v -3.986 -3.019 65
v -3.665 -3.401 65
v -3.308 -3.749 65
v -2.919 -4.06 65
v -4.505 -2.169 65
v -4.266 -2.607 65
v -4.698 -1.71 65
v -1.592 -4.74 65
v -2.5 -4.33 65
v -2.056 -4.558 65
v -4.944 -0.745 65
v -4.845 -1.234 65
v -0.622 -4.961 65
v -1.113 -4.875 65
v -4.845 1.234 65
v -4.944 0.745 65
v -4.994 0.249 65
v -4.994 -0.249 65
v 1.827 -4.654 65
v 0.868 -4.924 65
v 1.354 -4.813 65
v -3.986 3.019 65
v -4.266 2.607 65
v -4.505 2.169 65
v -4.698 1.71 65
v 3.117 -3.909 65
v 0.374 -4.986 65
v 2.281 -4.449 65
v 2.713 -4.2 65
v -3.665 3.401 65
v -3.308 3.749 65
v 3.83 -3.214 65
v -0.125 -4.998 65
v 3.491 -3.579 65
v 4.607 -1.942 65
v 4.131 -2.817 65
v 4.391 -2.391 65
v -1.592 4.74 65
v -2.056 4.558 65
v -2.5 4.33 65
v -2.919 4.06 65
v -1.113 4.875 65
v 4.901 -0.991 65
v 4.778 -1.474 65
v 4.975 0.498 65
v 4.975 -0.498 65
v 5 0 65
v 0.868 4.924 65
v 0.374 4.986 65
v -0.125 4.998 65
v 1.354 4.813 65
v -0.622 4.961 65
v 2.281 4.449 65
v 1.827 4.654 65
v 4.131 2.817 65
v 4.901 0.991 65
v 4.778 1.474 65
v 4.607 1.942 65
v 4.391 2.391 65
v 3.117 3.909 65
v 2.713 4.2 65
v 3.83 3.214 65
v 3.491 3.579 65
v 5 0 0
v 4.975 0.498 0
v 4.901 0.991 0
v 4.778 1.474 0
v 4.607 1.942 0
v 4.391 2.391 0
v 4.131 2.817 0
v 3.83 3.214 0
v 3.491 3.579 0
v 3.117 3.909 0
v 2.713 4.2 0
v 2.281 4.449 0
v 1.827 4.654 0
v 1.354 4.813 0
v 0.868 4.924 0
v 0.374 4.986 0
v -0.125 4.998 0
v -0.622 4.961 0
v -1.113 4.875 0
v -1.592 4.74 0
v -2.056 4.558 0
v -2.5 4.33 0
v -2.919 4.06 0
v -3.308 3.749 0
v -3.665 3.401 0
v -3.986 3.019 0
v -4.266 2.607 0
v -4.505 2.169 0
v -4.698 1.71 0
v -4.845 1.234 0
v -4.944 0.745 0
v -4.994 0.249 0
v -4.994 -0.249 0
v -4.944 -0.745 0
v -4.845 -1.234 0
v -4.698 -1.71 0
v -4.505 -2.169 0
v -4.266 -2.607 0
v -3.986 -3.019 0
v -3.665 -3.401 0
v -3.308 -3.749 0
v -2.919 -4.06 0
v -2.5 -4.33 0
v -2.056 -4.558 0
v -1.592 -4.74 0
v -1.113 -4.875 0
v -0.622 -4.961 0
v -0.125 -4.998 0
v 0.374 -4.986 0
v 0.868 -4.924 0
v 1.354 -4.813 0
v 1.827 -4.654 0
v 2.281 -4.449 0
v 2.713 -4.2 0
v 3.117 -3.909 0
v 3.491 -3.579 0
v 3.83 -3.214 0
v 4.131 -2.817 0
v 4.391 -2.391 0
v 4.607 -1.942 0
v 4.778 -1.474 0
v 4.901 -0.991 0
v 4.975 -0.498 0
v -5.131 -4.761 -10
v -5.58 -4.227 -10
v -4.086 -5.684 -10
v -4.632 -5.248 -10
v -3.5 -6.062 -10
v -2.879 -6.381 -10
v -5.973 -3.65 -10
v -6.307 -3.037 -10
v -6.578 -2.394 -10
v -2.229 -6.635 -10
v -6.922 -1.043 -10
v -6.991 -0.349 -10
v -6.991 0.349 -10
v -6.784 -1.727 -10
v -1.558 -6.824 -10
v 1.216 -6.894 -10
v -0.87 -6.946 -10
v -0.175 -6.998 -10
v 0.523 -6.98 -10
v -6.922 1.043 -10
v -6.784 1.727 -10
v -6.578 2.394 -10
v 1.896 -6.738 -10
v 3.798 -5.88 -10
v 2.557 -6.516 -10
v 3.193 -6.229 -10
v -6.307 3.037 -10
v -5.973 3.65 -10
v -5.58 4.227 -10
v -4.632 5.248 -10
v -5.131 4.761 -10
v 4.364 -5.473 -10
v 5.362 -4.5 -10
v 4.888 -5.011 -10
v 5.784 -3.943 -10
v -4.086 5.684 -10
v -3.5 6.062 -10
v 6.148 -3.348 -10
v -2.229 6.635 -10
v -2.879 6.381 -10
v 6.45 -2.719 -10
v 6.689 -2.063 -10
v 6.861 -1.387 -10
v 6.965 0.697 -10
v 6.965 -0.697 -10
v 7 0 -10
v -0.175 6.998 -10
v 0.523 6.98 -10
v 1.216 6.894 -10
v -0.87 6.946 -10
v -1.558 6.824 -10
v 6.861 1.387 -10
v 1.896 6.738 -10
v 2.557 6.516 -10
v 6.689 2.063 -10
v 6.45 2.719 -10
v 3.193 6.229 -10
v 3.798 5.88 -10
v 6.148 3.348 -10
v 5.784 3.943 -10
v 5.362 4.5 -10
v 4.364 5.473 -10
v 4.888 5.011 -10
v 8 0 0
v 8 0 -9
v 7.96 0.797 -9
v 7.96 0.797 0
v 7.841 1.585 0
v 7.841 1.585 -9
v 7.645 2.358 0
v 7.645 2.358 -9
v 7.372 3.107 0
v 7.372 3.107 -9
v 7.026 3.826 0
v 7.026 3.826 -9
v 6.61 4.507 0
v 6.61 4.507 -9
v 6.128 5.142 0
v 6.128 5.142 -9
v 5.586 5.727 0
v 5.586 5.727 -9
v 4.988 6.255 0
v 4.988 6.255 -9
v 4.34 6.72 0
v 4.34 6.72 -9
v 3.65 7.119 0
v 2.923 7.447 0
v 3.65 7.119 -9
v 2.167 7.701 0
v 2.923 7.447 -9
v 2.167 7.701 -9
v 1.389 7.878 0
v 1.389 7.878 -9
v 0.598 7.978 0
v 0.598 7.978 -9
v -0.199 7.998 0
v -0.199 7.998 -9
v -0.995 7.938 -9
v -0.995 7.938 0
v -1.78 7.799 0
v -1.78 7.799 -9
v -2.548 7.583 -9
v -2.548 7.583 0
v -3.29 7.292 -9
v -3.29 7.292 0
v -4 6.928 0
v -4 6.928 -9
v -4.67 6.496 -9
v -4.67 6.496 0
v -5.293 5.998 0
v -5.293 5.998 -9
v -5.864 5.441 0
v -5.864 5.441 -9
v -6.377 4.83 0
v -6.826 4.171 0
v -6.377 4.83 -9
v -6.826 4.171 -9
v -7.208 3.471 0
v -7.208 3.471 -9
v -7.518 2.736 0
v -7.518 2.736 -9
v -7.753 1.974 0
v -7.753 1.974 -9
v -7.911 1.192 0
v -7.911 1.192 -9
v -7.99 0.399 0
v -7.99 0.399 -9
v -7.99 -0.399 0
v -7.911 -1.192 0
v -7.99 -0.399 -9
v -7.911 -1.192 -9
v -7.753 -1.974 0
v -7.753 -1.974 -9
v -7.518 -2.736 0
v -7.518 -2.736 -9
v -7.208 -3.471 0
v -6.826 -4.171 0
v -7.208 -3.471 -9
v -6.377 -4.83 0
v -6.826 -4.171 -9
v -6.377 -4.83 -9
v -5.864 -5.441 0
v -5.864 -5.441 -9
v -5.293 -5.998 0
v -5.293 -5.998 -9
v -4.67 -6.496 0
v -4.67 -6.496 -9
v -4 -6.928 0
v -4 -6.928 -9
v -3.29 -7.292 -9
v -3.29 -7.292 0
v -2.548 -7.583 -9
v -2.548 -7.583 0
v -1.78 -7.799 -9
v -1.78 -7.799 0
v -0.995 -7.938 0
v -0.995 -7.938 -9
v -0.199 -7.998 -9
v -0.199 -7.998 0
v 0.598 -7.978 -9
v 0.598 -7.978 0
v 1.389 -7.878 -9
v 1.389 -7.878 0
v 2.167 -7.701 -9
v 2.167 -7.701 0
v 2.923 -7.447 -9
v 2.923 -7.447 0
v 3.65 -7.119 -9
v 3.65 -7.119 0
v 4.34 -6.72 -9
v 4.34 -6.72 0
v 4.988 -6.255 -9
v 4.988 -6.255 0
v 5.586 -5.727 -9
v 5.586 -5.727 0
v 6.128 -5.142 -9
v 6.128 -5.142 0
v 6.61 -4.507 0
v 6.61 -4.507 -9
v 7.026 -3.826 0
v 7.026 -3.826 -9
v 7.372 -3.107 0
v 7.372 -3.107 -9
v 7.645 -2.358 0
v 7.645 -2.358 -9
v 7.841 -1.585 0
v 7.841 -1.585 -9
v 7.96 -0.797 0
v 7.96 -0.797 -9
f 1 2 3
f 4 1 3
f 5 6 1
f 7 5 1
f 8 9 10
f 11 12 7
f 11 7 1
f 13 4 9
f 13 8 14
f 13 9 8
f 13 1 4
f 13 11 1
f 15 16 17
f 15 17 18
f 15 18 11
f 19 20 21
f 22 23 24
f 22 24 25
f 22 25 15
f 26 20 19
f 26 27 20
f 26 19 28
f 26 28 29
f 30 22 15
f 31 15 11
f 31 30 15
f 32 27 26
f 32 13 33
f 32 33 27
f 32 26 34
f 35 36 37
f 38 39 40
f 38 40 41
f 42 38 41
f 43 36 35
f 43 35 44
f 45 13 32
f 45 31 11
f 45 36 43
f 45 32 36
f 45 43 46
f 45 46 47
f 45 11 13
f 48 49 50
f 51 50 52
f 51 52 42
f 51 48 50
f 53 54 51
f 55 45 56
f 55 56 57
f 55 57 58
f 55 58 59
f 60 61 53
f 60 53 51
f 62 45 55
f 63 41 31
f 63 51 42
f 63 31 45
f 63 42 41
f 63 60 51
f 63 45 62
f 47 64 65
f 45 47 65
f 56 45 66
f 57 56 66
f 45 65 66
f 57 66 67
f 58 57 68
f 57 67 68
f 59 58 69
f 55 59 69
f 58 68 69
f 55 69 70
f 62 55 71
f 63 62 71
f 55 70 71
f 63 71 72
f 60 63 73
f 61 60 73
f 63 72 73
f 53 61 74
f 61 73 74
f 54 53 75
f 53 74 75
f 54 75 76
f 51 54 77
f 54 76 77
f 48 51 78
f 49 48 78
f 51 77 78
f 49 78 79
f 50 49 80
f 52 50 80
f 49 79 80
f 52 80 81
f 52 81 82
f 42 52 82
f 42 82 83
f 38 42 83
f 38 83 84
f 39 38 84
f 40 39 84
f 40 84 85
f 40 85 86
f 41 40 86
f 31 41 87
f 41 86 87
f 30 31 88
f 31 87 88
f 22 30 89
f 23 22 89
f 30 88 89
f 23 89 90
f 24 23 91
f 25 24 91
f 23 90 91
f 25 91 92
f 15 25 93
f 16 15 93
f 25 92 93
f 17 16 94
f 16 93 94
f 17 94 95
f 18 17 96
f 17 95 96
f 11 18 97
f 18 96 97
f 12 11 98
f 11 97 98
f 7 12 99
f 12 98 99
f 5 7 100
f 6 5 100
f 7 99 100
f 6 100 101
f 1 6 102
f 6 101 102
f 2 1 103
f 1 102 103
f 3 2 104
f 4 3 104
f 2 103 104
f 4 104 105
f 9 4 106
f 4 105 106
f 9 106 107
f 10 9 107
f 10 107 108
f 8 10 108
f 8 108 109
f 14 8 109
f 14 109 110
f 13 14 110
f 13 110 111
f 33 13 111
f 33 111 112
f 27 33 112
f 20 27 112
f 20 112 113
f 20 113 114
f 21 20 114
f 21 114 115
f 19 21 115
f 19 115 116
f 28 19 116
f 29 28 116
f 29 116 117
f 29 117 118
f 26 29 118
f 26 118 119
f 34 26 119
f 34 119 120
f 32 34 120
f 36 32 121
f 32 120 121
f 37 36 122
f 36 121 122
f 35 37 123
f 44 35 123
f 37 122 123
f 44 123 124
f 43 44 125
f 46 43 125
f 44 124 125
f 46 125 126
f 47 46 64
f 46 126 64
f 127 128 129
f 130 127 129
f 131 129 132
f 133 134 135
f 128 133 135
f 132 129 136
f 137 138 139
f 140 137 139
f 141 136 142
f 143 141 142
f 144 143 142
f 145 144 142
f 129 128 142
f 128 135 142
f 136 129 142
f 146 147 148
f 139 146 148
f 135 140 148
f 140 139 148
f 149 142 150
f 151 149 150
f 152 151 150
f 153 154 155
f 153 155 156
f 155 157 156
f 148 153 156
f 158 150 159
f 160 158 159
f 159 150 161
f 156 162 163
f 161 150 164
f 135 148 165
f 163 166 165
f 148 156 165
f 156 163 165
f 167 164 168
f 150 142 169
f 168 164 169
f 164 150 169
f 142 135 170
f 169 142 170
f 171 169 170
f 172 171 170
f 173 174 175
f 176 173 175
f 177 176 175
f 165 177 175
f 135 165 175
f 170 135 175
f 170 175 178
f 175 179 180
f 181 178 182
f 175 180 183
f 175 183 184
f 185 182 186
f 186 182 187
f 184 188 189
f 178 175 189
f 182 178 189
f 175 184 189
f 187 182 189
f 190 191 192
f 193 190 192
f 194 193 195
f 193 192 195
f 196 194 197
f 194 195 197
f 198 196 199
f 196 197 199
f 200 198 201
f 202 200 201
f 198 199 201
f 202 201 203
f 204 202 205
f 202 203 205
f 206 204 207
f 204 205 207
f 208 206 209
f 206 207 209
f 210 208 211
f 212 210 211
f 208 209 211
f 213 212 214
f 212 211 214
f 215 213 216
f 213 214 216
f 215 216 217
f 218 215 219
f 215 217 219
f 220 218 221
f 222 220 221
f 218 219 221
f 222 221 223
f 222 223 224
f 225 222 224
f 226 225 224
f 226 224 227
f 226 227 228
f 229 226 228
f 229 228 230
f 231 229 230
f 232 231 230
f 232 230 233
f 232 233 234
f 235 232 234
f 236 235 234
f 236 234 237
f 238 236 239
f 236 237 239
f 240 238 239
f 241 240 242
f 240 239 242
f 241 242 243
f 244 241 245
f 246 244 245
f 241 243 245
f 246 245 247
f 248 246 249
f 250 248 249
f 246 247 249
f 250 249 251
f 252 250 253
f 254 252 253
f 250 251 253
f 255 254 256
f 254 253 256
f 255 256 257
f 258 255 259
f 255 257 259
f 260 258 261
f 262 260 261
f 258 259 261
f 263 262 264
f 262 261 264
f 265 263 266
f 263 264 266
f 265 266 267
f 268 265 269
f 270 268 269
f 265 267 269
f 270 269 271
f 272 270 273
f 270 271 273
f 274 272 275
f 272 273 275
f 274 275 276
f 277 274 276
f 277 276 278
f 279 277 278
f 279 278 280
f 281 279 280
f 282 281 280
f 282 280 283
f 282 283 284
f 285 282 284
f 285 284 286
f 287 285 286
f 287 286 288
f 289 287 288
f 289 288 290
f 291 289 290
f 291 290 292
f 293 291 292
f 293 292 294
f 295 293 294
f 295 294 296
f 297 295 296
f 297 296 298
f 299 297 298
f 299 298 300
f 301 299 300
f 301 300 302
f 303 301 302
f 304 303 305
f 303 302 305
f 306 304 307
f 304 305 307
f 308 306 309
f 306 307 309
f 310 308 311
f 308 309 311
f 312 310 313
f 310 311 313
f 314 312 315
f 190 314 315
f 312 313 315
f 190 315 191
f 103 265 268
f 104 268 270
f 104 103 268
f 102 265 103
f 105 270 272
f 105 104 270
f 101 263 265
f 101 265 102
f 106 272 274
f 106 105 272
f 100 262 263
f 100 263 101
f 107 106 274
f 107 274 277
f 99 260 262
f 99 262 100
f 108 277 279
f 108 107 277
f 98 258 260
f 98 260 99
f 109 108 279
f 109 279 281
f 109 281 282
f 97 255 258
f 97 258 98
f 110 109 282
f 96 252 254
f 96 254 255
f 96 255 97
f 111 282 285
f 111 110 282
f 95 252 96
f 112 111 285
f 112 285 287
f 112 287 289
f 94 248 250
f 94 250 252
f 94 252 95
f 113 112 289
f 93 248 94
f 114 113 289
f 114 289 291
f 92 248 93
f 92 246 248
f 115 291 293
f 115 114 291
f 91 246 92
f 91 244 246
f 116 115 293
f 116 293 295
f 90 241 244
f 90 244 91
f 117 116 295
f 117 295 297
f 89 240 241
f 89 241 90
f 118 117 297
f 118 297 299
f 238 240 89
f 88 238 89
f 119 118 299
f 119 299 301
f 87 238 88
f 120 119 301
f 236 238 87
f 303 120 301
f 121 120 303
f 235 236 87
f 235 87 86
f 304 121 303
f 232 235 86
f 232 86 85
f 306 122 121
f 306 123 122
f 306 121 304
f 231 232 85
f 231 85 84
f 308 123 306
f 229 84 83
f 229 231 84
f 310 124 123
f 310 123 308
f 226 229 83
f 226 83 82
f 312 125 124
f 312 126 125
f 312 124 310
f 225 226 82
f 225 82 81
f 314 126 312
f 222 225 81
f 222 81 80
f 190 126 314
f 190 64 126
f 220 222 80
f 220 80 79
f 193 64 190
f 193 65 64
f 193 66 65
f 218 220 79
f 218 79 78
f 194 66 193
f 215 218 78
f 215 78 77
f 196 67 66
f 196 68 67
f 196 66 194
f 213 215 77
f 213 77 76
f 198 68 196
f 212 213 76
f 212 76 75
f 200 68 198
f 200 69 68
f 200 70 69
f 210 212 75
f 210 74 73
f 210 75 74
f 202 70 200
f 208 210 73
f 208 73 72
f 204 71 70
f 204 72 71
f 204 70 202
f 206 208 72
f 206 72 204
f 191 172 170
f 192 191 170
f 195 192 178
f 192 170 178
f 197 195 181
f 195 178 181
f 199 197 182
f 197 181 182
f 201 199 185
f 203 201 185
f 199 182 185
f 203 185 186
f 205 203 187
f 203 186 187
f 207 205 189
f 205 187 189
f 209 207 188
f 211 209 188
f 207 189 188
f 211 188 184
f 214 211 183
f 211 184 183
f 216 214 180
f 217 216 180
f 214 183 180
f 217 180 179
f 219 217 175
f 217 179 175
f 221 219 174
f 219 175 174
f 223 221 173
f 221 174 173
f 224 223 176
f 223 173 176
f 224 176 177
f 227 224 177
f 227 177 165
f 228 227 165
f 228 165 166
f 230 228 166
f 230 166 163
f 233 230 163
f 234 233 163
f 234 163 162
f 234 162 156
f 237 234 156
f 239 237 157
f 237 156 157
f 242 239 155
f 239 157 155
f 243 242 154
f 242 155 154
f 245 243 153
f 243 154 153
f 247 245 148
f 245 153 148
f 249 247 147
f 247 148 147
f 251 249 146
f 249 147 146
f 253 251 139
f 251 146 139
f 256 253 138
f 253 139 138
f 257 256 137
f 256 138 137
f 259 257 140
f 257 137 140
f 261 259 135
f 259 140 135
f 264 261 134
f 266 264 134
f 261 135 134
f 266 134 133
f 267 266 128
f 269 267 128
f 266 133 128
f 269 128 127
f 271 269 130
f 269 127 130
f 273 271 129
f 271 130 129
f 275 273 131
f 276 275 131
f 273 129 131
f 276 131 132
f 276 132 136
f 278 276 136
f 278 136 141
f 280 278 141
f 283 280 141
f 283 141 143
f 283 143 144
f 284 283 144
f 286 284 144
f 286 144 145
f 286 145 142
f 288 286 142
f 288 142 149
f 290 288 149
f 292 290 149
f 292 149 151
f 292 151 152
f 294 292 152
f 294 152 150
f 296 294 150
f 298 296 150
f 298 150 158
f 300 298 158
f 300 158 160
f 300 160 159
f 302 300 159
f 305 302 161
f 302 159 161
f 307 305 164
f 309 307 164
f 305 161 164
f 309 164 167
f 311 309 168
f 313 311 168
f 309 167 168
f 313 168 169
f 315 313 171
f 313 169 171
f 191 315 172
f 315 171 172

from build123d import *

# Parameters (mm, degrees)
SKETCH_1_R      = 5
EXTRUDE_1_DEPTH = 65
SKETCH_1_3_R    = 8
EXTRUDE_2_DEPTH = 10
CHAMFER_1_SIZE  = 1


with BuildPart() as part:
    # 草图1 → 凸台-拉伸1 (new body)
    with BuildSketch(Plane.XY):
        Circle(SKETCH_1_R)
    extrude(amount=EXTRUDE_1_DEPTH)

    # 草图1<3> → 凸台-拉伸2 (add)
    with BuildSketch(Plane.XY):
        Circle(SKETCH_1_3_R)
    extrude(amount=-EXTRUDE_2_DEPTH)

    # 倒角1
    chamfer_1_edges = [part.edges().sort_by_distance(p)[0] for p in [
        (-8, 0, -10),
    ]]
    chamfer(chamfer_1_edges, length=CHAMFER_1_SIZE)


solid = part.part
